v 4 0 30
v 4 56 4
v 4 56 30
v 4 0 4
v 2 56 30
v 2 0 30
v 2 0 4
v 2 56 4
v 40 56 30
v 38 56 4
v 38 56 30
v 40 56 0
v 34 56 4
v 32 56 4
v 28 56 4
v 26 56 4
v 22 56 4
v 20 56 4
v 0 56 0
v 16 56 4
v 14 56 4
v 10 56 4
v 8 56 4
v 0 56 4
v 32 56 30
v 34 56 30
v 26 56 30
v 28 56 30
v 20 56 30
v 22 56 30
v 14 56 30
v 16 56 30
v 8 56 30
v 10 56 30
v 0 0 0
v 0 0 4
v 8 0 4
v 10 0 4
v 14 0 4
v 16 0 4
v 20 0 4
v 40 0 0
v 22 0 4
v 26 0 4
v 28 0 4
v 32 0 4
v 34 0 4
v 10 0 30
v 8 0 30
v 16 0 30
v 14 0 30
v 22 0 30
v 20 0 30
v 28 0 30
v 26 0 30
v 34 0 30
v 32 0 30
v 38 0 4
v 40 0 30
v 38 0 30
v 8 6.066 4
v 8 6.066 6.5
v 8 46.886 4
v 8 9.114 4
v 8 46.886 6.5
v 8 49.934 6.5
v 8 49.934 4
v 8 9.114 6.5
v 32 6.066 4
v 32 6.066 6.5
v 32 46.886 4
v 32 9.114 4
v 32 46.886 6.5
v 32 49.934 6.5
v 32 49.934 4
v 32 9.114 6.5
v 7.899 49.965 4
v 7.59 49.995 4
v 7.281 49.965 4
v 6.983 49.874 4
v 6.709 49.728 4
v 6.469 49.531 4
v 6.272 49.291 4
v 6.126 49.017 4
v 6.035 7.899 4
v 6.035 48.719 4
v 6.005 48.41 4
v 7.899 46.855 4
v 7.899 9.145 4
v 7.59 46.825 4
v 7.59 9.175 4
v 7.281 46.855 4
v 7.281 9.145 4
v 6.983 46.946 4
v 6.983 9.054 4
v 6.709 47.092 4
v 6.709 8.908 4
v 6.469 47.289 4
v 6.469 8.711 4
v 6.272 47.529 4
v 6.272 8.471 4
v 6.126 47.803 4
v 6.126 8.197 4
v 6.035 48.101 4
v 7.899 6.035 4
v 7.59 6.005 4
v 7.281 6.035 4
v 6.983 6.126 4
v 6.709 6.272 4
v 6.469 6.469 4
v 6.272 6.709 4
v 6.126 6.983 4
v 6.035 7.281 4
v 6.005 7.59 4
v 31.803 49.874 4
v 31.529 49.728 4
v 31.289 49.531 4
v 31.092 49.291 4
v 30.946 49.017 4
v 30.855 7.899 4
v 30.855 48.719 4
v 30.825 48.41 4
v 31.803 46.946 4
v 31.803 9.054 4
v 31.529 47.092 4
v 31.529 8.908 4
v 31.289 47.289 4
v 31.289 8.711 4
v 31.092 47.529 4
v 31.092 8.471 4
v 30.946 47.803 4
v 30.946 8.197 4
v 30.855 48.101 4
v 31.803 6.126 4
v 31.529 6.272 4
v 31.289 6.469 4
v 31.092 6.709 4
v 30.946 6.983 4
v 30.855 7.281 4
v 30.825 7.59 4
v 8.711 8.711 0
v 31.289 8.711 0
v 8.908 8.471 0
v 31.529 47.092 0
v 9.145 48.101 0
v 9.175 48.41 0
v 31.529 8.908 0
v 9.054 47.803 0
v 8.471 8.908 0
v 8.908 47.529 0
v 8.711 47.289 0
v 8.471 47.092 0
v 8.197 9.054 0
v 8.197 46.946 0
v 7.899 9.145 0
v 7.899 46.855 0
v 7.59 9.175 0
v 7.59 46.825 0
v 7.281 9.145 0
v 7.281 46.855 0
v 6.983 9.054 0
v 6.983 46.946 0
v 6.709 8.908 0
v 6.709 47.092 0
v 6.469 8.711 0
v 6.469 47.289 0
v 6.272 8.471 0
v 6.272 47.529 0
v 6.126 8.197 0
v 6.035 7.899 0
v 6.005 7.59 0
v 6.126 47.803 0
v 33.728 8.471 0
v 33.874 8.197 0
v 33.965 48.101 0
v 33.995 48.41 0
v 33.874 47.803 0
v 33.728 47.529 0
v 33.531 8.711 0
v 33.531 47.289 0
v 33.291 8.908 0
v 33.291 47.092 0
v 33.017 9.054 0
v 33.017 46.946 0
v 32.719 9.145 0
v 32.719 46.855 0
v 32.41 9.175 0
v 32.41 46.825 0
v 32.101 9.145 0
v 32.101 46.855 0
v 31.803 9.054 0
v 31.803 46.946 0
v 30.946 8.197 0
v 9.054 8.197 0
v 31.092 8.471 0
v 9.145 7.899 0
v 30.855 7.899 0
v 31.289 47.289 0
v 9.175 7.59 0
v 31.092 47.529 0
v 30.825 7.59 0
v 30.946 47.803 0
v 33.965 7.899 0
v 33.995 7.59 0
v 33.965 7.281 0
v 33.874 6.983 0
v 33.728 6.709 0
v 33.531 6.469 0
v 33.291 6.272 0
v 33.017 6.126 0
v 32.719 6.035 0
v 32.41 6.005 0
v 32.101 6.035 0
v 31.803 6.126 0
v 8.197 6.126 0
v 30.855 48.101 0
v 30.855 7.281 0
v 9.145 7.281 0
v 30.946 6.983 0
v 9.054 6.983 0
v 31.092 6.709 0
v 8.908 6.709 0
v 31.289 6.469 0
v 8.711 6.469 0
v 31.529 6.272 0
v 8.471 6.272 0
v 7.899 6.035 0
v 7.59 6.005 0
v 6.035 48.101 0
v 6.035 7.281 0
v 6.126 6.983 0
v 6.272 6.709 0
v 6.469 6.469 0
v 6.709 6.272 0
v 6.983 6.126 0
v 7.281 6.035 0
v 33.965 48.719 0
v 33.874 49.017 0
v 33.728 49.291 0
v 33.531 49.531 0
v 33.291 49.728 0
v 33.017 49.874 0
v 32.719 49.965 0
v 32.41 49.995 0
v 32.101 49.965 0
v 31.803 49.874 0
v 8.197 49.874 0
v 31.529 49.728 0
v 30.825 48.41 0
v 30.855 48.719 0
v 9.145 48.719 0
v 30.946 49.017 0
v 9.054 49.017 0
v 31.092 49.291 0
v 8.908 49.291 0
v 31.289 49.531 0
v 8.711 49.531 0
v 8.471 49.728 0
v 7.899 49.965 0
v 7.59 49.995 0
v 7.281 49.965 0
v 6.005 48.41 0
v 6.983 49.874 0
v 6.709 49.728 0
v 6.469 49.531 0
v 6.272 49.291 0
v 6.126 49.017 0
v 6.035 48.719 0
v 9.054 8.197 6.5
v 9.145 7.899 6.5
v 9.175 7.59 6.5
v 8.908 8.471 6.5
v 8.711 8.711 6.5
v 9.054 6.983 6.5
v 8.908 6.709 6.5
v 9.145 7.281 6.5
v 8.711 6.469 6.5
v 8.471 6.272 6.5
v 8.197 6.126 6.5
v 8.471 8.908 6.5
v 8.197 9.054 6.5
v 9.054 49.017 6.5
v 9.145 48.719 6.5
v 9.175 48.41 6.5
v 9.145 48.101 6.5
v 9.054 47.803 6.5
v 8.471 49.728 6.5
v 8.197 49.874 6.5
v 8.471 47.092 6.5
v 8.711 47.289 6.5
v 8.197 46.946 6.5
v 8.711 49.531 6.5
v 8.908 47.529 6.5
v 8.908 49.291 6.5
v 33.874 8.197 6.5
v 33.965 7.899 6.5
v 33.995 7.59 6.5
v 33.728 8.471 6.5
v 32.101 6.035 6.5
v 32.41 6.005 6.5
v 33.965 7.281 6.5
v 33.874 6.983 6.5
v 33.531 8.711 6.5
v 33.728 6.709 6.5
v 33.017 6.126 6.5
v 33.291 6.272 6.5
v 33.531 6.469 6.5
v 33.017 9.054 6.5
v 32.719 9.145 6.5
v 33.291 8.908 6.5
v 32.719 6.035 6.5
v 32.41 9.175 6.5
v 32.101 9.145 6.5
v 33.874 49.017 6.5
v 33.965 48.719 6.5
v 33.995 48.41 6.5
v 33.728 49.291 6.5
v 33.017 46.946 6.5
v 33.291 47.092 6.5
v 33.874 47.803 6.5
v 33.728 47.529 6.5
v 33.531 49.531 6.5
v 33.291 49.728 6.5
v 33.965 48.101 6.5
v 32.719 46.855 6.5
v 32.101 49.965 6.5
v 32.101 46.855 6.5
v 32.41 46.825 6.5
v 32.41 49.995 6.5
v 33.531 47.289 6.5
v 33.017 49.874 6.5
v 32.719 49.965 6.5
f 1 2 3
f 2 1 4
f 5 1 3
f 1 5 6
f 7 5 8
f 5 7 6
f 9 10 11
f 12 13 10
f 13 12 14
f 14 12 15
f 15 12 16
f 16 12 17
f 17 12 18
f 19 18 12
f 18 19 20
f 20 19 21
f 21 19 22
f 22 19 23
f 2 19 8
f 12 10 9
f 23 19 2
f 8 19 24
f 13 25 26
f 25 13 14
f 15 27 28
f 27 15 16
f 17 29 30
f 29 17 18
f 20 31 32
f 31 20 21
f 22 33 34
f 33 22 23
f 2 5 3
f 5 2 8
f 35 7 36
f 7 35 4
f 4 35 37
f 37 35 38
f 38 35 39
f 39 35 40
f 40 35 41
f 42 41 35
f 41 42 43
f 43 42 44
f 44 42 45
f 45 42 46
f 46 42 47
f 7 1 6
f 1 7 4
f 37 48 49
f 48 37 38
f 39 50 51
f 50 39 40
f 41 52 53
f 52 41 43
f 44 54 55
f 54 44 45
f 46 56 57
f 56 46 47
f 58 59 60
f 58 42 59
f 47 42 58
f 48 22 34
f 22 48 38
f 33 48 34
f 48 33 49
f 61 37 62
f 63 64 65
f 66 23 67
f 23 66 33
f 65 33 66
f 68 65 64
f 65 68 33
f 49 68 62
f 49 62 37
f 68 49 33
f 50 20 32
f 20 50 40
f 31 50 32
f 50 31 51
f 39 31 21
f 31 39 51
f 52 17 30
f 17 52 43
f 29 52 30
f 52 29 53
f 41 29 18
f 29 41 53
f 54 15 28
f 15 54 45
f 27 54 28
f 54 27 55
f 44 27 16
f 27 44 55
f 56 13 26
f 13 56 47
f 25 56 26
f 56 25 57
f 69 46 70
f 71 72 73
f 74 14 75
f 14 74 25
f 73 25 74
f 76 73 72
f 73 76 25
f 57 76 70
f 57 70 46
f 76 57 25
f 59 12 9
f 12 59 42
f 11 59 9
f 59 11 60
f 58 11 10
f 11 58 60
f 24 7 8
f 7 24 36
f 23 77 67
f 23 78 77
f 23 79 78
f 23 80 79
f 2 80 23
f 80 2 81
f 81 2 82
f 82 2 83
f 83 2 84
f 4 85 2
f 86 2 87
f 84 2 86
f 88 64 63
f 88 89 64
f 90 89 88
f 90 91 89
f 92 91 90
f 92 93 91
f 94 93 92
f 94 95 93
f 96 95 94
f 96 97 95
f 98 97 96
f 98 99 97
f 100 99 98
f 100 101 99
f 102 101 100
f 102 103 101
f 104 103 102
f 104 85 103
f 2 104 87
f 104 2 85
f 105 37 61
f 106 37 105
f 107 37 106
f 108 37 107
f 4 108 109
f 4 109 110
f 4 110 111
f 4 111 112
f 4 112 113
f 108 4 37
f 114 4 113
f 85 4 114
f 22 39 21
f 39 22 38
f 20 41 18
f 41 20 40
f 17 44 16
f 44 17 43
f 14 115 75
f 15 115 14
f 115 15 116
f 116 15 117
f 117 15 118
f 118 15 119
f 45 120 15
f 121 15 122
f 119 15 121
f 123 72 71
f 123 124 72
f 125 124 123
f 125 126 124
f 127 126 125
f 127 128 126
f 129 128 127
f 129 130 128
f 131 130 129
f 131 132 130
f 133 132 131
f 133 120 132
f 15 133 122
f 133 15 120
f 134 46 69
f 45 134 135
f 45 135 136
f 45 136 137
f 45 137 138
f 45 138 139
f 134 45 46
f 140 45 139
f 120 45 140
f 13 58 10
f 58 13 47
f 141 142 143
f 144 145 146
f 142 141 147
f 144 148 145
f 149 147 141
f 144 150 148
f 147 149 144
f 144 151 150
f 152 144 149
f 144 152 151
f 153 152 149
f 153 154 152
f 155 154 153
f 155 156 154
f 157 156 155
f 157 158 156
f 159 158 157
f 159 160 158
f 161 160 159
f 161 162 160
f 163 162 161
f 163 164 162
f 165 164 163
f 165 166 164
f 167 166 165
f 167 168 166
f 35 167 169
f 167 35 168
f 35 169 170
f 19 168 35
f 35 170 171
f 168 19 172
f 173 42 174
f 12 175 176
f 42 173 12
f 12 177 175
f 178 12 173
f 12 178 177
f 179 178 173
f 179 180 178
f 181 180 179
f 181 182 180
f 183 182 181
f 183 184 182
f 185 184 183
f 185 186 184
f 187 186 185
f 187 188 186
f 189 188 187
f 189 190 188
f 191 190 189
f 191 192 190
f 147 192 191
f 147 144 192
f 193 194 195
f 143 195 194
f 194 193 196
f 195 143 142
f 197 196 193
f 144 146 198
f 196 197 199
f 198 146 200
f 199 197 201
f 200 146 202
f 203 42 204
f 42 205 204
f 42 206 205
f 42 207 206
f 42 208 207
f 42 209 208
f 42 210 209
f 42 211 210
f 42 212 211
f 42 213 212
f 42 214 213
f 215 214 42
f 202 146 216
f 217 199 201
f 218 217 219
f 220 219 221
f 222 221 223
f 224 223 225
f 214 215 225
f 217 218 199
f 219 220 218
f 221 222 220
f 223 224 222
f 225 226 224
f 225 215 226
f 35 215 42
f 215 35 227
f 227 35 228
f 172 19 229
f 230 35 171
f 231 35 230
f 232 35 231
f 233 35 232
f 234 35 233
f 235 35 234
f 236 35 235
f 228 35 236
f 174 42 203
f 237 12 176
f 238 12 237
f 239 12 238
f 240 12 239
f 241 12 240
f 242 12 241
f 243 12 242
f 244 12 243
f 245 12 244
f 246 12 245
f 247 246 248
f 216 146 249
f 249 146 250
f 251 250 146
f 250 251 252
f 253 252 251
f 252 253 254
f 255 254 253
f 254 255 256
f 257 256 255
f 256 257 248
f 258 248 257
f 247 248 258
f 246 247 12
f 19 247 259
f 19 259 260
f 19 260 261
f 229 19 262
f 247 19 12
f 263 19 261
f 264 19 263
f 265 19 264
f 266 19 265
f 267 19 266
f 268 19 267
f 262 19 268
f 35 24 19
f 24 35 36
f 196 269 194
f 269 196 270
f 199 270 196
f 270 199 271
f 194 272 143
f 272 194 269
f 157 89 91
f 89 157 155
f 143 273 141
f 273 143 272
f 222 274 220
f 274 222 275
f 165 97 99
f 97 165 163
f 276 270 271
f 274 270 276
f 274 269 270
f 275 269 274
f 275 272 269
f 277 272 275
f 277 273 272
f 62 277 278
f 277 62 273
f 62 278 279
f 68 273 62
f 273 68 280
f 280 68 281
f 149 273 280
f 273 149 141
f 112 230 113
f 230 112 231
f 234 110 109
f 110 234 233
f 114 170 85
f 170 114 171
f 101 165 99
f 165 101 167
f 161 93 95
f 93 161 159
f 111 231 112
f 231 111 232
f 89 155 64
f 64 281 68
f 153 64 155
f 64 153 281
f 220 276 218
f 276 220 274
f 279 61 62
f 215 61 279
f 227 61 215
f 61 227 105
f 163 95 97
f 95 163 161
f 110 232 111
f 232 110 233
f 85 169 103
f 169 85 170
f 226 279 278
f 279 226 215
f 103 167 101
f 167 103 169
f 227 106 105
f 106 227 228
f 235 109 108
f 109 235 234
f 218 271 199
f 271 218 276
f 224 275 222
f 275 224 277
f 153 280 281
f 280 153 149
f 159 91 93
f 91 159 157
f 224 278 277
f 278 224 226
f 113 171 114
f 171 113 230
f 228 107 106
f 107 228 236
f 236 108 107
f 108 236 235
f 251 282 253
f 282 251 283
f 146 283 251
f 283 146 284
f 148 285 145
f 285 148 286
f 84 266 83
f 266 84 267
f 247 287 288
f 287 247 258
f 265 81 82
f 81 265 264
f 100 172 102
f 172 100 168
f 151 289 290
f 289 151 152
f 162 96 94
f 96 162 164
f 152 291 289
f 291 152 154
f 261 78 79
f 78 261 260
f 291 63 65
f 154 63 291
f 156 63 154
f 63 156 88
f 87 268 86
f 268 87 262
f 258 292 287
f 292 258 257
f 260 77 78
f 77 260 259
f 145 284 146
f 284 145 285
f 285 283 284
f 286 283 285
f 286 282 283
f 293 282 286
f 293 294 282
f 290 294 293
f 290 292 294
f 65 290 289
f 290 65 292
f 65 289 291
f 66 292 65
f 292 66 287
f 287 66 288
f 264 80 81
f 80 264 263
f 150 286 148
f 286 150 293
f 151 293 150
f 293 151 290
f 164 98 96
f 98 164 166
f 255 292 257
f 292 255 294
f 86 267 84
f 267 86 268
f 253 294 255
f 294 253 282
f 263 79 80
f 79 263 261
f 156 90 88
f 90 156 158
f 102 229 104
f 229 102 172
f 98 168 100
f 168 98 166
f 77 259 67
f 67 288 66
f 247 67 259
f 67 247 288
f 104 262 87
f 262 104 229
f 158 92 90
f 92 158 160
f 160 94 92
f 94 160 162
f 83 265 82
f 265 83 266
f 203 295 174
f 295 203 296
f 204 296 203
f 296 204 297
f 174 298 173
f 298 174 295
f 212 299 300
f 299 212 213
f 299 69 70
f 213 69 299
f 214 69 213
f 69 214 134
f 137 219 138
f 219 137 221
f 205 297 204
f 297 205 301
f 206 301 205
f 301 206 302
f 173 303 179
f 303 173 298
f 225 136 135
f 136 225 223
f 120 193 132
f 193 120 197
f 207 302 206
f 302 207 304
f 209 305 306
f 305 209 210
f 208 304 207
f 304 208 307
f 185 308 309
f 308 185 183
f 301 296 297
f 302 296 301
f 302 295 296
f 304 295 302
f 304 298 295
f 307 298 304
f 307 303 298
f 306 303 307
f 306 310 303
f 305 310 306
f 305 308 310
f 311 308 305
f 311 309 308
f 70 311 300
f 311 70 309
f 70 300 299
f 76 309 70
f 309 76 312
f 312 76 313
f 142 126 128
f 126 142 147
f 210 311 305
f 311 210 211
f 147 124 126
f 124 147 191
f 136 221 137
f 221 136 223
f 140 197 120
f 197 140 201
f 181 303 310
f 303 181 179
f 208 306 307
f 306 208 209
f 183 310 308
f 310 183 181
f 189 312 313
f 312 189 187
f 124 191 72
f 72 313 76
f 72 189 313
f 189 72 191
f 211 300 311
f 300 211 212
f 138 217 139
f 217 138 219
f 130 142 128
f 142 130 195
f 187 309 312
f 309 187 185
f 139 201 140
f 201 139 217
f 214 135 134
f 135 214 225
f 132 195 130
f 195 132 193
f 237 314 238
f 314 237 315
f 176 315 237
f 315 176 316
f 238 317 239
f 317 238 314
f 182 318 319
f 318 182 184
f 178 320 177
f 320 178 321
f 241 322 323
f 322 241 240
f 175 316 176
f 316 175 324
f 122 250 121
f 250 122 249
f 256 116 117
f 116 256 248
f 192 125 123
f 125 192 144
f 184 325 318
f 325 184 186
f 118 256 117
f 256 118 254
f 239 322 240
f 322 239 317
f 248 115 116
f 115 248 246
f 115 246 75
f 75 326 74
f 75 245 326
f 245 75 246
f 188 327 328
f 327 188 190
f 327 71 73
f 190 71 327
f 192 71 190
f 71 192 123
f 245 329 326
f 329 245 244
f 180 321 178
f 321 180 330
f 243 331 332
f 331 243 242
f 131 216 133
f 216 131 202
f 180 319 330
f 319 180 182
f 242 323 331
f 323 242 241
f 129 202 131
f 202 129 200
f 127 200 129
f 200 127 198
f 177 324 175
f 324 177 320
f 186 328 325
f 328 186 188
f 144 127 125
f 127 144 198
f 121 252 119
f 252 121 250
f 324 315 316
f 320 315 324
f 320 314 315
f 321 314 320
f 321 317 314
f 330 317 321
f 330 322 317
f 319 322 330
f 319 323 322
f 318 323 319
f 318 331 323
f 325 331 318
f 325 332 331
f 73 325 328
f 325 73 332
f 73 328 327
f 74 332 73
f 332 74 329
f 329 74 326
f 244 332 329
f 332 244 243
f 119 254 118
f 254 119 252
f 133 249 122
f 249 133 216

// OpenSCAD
$fn = 32;

// ----------------------------------------------------------------------
// Finned heat sink: 40 x 56 mm base, 26 mm fins
// ----------------------------------------------------------------------

// --- parameters (mm) ---
base_w = 40;              // base width
base_d = 56;              // base depth
base_t = 4;               // base thickness
fin_h = 26;               // fin height above the base
holes_d = 3.17;           // fixing holes
hole_x = 12.41;           // hole offset in x
hole_y = 20.41;           // hole offset in y
fin_t = 2;                // fin thickness
fin_pitch = 6;            // fin pitch
fin_count = 7;            // number of fins
fin_x0 = 2;               // first fin offset

difference() {
  union() {
    cube([base_w, base_d, base_t]);
    for (i = [0 : fin_count - 1]) {
      translate([fin_x0 + i * fin_pitch, 0, base_t - 0.5]) cube([fin_t, base_d, fin_h + 0.5]);
    }
  }
  /* fixing holes through the base, 2.5 mm clear on both sides */
  for (hx = [-12.41, 12.41]) {
    for (hy = [-20.41, 20.41]) {
      translate([base_w / 2 + hx, base_d / 2 + hy, -2.5]) cylinder(h = base_t + 5, d = holes_d);
    }
  }
}
